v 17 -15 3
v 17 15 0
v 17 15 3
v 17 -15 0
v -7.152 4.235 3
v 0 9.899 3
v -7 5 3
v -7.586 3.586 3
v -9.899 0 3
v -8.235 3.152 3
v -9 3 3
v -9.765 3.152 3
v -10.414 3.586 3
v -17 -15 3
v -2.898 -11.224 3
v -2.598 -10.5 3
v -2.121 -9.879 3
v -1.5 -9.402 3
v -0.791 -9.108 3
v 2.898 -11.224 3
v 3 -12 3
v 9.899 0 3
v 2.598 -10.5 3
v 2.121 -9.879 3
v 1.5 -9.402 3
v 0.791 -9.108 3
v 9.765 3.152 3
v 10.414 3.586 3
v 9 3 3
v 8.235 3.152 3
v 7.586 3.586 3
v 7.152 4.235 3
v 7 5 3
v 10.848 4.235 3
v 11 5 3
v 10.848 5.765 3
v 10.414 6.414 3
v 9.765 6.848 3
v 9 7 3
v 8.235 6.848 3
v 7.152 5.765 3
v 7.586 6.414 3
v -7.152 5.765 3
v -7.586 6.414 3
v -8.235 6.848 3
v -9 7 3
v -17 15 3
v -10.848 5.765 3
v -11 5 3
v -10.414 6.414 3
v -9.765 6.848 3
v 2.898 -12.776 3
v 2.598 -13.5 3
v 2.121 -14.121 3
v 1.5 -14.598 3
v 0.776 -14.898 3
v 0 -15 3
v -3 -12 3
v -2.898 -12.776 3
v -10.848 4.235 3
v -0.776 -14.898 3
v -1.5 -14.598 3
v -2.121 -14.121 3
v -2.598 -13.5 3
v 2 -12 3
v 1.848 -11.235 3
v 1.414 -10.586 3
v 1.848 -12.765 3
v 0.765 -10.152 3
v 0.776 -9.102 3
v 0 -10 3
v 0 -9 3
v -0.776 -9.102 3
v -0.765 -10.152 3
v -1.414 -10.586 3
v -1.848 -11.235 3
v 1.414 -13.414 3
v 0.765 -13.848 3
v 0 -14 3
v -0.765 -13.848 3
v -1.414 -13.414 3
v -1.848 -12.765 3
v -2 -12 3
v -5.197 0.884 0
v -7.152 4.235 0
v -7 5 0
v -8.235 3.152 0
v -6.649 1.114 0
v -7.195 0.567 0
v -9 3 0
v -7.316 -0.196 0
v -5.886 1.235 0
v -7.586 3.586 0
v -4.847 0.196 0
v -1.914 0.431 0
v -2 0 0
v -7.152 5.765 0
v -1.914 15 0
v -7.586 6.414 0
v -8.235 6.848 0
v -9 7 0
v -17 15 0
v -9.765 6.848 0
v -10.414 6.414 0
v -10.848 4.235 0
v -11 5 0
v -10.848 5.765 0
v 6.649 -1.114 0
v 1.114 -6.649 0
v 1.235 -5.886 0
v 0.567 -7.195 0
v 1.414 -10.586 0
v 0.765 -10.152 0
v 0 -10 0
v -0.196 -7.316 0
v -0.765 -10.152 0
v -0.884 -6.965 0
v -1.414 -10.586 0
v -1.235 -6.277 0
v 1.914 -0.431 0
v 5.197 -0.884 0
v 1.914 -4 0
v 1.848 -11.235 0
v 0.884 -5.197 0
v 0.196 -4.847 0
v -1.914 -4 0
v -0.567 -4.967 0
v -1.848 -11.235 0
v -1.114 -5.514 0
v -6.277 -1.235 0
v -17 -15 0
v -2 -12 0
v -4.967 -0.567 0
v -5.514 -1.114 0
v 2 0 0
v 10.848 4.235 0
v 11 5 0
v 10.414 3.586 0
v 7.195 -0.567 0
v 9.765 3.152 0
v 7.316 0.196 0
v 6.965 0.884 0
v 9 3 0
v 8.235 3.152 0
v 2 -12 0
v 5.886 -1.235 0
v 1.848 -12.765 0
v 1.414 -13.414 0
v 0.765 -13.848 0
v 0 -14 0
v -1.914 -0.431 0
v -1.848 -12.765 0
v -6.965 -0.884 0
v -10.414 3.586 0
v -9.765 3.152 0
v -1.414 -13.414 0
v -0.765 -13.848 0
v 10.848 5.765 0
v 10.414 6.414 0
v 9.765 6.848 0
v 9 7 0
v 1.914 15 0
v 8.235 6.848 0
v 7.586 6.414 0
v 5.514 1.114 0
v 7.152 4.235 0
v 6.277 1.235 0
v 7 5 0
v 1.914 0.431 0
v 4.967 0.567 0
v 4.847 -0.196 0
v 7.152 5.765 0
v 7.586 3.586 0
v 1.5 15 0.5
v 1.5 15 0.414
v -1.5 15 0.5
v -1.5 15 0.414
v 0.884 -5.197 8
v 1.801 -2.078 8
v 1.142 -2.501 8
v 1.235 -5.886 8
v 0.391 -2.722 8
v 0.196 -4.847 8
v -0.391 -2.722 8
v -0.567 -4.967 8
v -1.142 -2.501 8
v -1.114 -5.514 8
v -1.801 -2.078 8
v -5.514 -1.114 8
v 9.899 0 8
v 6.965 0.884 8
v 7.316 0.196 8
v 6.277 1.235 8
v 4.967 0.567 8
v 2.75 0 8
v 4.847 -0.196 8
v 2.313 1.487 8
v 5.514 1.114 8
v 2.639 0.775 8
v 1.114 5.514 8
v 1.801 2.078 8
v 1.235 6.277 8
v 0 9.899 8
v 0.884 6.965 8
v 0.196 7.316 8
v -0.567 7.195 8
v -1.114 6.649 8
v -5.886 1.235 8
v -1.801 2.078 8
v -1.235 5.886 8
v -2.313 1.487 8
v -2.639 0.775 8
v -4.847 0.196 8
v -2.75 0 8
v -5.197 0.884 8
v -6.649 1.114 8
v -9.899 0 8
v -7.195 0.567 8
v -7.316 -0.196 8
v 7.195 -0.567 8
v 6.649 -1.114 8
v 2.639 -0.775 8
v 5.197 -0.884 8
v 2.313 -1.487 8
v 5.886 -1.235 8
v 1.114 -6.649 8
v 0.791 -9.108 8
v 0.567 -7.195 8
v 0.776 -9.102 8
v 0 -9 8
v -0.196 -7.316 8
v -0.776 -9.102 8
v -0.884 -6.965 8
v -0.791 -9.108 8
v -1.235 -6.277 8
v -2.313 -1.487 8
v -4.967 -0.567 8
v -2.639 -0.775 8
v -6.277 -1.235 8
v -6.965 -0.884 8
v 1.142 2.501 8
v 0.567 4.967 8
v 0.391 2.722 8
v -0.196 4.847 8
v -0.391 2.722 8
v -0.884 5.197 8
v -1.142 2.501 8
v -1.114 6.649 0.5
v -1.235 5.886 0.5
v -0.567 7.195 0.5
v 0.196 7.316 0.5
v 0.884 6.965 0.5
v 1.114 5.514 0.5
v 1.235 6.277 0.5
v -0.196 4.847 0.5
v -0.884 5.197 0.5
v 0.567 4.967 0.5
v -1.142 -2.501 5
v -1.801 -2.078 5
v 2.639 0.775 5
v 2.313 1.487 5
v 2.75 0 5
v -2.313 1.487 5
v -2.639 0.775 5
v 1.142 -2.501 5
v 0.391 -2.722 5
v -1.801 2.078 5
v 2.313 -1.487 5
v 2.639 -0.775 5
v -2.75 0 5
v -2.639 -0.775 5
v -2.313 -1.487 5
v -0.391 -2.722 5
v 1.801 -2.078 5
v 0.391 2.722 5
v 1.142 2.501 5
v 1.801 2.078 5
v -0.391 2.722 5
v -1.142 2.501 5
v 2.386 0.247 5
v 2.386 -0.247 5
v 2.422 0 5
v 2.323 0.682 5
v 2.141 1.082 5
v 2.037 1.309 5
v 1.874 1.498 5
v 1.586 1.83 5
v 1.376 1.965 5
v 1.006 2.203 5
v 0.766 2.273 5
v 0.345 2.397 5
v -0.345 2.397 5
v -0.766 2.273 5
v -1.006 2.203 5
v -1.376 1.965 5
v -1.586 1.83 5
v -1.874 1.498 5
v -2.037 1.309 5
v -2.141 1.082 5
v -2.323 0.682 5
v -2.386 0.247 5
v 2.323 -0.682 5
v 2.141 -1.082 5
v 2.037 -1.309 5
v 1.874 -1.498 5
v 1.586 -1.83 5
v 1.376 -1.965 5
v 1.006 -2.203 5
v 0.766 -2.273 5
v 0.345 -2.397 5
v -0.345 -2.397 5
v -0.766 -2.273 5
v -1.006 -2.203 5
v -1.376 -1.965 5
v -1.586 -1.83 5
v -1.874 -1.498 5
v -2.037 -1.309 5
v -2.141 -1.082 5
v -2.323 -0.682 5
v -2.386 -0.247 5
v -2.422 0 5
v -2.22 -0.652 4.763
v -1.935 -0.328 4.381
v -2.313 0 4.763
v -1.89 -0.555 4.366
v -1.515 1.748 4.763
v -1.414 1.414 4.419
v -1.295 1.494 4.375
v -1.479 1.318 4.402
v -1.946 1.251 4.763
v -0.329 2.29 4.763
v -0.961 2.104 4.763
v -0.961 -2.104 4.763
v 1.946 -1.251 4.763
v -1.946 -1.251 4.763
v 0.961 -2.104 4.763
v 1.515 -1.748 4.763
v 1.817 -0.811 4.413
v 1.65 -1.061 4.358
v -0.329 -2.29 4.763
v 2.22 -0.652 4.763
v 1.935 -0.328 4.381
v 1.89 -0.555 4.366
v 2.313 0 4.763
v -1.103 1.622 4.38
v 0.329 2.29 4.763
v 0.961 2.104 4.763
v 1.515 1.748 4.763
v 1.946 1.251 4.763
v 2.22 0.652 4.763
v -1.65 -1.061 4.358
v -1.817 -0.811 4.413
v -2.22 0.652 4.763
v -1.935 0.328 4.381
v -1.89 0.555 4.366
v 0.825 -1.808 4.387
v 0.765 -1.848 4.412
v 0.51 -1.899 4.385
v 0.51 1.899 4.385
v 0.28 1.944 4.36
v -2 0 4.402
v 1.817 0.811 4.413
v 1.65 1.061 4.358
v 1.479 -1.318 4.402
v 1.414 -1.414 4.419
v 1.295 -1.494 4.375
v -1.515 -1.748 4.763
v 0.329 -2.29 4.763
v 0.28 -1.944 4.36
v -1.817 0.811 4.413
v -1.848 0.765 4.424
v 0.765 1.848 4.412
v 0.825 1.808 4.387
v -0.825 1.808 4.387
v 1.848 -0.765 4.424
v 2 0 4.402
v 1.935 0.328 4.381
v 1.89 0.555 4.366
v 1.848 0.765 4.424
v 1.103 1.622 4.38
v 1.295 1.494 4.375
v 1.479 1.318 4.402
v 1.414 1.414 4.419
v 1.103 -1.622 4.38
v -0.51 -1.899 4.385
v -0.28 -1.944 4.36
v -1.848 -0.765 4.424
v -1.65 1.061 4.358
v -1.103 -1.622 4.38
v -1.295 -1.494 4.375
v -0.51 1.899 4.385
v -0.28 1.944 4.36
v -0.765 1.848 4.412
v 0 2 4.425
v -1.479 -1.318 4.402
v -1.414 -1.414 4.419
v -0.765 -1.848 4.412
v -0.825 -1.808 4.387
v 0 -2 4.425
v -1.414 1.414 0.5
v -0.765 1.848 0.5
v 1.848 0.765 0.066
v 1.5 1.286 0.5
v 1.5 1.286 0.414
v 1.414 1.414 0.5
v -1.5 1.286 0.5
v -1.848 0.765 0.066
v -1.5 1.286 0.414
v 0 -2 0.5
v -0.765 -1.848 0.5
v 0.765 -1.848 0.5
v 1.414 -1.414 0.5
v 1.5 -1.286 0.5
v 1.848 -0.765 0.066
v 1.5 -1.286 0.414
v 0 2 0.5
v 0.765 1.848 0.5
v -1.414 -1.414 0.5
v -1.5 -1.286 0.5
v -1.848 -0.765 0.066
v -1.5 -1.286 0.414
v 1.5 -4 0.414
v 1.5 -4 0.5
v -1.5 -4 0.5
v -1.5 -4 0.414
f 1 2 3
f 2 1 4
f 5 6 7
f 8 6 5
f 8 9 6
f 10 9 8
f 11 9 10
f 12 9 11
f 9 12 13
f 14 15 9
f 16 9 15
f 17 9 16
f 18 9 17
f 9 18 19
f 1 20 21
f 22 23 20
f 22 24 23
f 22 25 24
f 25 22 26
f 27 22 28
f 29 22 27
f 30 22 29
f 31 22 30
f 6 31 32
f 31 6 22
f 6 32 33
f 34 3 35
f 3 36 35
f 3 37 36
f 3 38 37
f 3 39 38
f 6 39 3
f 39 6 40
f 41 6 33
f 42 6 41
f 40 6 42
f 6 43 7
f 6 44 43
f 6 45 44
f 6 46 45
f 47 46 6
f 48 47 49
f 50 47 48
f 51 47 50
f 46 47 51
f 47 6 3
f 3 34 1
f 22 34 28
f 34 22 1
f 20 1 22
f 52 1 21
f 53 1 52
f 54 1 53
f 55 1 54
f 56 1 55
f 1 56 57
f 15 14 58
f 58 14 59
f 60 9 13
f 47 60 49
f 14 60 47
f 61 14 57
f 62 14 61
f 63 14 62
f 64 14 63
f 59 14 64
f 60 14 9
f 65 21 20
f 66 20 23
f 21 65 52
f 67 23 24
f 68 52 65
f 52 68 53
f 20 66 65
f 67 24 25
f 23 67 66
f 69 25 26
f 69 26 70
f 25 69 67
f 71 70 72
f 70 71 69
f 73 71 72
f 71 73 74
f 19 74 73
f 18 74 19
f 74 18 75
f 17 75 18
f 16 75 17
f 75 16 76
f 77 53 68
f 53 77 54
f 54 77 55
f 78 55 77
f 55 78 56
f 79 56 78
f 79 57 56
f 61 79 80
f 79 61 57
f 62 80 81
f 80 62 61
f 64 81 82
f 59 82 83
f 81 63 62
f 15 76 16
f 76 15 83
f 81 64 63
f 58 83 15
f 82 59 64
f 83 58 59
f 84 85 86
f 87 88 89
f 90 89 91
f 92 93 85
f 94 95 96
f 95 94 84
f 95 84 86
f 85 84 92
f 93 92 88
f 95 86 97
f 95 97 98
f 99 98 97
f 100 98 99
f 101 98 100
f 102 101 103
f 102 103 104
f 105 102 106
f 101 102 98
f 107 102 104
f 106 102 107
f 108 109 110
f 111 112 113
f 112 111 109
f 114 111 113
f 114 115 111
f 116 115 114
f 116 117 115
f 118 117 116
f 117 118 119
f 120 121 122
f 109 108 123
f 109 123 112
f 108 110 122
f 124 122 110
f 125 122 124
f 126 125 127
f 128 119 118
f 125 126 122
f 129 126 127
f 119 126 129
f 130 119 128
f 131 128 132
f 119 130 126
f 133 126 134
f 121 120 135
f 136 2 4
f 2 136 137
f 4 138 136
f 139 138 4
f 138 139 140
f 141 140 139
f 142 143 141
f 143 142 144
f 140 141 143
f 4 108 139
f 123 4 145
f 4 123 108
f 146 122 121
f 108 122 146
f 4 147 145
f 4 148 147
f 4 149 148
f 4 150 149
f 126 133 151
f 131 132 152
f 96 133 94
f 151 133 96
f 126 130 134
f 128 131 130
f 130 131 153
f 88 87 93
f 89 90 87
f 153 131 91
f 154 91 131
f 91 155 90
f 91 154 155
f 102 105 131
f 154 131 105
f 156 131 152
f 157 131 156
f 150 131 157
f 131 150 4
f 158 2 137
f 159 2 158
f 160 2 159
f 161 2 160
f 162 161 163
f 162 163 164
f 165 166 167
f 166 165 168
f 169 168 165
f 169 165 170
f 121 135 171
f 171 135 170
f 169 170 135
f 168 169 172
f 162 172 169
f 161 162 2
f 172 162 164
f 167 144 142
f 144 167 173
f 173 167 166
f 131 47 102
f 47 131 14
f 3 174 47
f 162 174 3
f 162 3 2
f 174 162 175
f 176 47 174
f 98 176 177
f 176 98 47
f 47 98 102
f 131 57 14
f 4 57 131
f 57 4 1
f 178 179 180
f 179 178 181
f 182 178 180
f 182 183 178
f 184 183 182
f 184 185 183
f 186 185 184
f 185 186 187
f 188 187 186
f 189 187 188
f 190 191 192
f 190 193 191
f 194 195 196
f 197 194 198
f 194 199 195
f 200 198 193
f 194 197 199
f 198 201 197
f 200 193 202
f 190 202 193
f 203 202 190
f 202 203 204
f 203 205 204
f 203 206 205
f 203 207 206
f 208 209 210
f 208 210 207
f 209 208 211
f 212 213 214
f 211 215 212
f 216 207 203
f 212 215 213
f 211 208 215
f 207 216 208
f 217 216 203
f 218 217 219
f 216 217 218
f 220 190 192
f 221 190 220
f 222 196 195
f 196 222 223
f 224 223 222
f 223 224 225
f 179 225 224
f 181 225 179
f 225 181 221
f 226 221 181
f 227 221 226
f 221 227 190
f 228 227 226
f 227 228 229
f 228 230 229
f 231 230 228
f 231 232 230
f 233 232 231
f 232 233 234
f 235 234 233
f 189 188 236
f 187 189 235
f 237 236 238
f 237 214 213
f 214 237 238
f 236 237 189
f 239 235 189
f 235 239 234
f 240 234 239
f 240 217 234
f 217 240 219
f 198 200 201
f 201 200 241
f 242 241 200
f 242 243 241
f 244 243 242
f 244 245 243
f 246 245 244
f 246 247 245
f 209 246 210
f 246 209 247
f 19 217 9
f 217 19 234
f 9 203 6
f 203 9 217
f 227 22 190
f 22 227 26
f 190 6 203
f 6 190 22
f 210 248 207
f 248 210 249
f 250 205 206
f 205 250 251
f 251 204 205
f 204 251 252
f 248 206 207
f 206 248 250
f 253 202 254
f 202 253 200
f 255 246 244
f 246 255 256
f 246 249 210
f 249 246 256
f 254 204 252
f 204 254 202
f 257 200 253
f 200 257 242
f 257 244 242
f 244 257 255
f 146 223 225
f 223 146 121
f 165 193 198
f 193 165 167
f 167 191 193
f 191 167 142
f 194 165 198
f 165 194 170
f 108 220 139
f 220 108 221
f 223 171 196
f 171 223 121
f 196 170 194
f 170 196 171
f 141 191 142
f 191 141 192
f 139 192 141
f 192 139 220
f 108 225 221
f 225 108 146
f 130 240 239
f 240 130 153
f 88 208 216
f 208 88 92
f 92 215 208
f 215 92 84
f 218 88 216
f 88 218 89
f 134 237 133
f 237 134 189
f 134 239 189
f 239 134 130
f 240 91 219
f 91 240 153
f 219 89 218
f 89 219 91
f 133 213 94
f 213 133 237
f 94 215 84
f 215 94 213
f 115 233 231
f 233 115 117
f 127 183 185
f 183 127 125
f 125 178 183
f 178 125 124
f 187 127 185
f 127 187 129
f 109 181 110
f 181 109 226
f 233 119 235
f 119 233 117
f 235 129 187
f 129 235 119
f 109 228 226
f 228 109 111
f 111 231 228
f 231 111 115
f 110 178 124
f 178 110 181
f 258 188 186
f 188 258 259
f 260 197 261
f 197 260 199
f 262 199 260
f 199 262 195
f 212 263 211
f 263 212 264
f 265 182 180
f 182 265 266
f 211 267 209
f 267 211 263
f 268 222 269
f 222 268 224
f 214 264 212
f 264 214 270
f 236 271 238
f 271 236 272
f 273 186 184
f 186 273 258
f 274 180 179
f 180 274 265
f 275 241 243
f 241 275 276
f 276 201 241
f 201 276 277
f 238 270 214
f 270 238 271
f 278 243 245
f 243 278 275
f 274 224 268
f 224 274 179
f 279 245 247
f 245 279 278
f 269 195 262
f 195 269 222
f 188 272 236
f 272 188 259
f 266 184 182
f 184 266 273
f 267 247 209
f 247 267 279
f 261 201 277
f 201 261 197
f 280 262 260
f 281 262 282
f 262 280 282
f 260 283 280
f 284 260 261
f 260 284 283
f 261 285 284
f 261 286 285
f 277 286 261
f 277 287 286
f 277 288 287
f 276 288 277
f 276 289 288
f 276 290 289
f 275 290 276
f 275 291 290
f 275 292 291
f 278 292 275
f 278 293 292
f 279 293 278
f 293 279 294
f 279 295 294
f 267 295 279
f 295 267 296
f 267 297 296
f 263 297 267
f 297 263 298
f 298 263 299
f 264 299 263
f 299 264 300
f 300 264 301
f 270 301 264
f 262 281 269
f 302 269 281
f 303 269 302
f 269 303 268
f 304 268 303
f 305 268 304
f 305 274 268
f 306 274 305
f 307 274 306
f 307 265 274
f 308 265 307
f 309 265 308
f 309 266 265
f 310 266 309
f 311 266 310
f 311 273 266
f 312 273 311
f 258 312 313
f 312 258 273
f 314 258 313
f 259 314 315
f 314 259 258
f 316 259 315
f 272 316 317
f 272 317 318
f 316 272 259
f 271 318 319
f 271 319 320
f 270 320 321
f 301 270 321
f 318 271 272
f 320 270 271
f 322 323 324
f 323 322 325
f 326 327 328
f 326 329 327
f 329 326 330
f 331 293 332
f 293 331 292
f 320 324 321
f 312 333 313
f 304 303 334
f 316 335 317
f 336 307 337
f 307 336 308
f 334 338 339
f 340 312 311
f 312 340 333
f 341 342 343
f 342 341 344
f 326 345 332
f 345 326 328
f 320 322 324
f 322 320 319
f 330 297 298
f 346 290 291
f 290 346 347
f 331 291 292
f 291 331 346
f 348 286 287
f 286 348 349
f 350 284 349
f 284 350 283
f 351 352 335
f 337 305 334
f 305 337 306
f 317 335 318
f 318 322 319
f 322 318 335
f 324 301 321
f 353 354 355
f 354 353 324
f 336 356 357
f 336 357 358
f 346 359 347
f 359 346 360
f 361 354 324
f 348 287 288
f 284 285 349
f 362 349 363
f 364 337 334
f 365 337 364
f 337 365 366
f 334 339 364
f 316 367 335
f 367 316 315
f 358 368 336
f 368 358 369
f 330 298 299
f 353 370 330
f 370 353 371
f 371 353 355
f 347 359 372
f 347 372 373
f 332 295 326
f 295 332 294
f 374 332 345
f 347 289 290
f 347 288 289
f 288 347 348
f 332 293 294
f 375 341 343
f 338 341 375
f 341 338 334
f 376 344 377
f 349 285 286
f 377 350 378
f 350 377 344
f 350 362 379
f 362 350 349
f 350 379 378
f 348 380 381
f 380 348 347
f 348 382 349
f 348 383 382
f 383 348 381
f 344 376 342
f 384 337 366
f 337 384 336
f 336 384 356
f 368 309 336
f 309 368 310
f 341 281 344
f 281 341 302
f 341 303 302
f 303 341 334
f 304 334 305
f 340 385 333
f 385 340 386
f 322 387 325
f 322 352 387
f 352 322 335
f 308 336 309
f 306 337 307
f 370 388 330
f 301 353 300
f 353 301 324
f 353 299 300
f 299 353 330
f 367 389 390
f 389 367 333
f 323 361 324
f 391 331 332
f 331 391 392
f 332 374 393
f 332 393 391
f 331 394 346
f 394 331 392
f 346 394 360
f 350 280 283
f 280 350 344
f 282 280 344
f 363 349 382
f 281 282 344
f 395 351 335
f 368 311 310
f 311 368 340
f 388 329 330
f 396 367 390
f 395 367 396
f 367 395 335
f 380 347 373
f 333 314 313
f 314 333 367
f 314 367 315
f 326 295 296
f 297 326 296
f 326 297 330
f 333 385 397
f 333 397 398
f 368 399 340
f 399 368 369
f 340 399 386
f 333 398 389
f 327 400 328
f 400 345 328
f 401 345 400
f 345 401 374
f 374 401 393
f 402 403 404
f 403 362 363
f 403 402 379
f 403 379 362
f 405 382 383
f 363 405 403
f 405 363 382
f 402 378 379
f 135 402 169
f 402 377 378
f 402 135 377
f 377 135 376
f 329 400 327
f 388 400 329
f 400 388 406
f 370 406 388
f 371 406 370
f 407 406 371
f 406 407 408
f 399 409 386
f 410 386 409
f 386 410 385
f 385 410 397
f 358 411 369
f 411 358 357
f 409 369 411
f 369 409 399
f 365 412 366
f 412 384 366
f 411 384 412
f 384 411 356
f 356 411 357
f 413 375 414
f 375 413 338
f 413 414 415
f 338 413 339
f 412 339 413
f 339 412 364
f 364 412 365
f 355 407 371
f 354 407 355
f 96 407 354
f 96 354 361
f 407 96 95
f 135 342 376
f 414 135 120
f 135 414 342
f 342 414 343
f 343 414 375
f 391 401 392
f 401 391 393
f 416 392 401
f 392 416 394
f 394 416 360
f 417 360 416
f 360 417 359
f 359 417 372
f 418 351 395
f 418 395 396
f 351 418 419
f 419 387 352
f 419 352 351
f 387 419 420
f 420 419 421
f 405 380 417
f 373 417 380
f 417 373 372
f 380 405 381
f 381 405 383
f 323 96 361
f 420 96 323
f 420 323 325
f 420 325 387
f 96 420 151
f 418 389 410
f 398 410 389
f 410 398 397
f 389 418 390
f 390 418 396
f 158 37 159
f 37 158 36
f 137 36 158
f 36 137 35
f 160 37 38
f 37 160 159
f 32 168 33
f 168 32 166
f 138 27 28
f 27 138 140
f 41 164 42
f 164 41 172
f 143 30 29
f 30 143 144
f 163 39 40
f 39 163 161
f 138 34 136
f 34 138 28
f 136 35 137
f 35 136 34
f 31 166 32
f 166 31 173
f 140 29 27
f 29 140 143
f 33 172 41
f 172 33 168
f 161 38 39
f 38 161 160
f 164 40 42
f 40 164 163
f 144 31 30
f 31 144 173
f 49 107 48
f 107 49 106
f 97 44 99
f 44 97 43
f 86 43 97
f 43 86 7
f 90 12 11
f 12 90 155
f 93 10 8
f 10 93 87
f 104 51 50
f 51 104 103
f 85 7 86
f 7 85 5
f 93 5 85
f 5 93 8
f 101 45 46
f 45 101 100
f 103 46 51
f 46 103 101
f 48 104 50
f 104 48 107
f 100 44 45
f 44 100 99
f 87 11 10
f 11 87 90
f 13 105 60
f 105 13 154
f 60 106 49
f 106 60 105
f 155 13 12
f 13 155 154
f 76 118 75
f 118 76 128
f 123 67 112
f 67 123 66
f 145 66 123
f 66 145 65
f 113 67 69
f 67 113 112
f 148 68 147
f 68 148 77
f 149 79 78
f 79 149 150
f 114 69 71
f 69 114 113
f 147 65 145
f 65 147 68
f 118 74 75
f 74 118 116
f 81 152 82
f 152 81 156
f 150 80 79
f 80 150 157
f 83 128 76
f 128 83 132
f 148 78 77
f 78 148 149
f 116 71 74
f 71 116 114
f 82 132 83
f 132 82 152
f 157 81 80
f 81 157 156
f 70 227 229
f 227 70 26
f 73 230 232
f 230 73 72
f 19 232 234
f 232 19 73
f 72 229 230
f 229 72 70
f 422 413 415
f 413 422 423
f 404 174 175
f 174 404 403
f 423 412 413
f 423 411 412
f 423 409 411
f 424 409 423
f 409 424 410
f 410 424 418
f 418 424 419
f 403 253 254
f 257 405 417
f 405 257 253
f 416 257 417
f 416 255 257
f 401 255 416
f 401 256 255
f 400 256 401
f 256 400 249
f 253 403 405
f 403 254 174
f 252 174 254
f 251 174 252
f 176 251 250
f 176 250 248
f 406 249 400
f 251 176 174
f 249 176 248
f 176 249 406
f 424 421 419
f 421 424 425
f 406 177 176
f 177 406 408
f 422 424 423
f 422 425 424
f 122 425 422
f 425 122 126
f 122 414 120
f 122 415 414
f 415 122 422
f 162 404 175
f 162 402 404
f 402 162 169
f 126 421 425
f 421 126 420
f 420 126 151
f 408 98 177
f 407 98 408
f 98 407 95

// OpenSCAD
/************************************
*  CuvetteMountOuter
*    connection for fiber optic to inner Cuvette mount
*    consistes of mount and spacer.  
*    5 mm ball lens goes in mount, spacer on top
*    Flanged sma905 connector screws to that
************************************/
pSpacer = false;

width = 34;
depth = 30;
xy = [1,-1];
xVal = 12;  // mounting hole dimensions
yVal = 10;
diam = 10;
spacer = 1;
ballDepth = 3.5;

holeDiam = [2.5,4];

$fa = 6;  // make holes roundish
$fs = 0.8;

module fourHole(x, y, dia, angle){
 //   xy = [1,-1];
for(a = [0:1],b=[0:1]){
    rotate([0,0,angle])
translate([x/2*xy[a],y/2*xy[b],5])
    cylinder(11,d=dia,center = true);
}    
}
if(pSpacer == true){
    difference(){
    translate([0,25,spacer/2])
     cube([14, 14,spacer], center = true);
        translate([0,25,0])
    fourHole(8.6,8.6,holeDiam[1],0);
         translate([0,25,4])
 cylinder(10,d=4,center = true); 
    }
}
else{
difference(){
 union(){
  translate([0,0,1.5])
  cube([width,depth,3],center = true);
          rotate([0,0,45])
  translate([0,0,5])
    cube([14, 14,6], center = true);
  
    }  // end of union
 
//  fourHole(2*xVal,2*yVal,holeDiam[1],0); 
  fourHole(8.6,8.6,holeDiam[0],45);

 translate([0,0,9-ballDepth/2])
 cylinder(ballDepth+1,d=5.5,center = true);  //top cylinder to put ball in
 translate([0,0,8-ballDepth/2])
 sphere(d=5.5);
 translate([0,0,4])
 cylinder(10,d=4,center = true);

        translate([9,5,0])
    cylinder(14,d = 4, center = true);
    translate([-9,5,0])
    cylinder(14,d = 4, center = true);
    translate([0,-12,0])
    cylinder(14,d = 4, center = true);
    translate([0,-12,10])
    cylinder(14,d = 6, center = true);
  translate([0,6,0])
  //rotate([0,45,0])
  cube([3.,20,1.],center = true);  //  groove to keep from scratching  
  translate([1.5,6,-1])
  rotate([0,45,0])
  cube([2.,20,2.],center = true); 
  translate([-1.5,6,-1])
  rotate([0,45,0])
  cube([2.,20,2.],center = true); 
}
}
